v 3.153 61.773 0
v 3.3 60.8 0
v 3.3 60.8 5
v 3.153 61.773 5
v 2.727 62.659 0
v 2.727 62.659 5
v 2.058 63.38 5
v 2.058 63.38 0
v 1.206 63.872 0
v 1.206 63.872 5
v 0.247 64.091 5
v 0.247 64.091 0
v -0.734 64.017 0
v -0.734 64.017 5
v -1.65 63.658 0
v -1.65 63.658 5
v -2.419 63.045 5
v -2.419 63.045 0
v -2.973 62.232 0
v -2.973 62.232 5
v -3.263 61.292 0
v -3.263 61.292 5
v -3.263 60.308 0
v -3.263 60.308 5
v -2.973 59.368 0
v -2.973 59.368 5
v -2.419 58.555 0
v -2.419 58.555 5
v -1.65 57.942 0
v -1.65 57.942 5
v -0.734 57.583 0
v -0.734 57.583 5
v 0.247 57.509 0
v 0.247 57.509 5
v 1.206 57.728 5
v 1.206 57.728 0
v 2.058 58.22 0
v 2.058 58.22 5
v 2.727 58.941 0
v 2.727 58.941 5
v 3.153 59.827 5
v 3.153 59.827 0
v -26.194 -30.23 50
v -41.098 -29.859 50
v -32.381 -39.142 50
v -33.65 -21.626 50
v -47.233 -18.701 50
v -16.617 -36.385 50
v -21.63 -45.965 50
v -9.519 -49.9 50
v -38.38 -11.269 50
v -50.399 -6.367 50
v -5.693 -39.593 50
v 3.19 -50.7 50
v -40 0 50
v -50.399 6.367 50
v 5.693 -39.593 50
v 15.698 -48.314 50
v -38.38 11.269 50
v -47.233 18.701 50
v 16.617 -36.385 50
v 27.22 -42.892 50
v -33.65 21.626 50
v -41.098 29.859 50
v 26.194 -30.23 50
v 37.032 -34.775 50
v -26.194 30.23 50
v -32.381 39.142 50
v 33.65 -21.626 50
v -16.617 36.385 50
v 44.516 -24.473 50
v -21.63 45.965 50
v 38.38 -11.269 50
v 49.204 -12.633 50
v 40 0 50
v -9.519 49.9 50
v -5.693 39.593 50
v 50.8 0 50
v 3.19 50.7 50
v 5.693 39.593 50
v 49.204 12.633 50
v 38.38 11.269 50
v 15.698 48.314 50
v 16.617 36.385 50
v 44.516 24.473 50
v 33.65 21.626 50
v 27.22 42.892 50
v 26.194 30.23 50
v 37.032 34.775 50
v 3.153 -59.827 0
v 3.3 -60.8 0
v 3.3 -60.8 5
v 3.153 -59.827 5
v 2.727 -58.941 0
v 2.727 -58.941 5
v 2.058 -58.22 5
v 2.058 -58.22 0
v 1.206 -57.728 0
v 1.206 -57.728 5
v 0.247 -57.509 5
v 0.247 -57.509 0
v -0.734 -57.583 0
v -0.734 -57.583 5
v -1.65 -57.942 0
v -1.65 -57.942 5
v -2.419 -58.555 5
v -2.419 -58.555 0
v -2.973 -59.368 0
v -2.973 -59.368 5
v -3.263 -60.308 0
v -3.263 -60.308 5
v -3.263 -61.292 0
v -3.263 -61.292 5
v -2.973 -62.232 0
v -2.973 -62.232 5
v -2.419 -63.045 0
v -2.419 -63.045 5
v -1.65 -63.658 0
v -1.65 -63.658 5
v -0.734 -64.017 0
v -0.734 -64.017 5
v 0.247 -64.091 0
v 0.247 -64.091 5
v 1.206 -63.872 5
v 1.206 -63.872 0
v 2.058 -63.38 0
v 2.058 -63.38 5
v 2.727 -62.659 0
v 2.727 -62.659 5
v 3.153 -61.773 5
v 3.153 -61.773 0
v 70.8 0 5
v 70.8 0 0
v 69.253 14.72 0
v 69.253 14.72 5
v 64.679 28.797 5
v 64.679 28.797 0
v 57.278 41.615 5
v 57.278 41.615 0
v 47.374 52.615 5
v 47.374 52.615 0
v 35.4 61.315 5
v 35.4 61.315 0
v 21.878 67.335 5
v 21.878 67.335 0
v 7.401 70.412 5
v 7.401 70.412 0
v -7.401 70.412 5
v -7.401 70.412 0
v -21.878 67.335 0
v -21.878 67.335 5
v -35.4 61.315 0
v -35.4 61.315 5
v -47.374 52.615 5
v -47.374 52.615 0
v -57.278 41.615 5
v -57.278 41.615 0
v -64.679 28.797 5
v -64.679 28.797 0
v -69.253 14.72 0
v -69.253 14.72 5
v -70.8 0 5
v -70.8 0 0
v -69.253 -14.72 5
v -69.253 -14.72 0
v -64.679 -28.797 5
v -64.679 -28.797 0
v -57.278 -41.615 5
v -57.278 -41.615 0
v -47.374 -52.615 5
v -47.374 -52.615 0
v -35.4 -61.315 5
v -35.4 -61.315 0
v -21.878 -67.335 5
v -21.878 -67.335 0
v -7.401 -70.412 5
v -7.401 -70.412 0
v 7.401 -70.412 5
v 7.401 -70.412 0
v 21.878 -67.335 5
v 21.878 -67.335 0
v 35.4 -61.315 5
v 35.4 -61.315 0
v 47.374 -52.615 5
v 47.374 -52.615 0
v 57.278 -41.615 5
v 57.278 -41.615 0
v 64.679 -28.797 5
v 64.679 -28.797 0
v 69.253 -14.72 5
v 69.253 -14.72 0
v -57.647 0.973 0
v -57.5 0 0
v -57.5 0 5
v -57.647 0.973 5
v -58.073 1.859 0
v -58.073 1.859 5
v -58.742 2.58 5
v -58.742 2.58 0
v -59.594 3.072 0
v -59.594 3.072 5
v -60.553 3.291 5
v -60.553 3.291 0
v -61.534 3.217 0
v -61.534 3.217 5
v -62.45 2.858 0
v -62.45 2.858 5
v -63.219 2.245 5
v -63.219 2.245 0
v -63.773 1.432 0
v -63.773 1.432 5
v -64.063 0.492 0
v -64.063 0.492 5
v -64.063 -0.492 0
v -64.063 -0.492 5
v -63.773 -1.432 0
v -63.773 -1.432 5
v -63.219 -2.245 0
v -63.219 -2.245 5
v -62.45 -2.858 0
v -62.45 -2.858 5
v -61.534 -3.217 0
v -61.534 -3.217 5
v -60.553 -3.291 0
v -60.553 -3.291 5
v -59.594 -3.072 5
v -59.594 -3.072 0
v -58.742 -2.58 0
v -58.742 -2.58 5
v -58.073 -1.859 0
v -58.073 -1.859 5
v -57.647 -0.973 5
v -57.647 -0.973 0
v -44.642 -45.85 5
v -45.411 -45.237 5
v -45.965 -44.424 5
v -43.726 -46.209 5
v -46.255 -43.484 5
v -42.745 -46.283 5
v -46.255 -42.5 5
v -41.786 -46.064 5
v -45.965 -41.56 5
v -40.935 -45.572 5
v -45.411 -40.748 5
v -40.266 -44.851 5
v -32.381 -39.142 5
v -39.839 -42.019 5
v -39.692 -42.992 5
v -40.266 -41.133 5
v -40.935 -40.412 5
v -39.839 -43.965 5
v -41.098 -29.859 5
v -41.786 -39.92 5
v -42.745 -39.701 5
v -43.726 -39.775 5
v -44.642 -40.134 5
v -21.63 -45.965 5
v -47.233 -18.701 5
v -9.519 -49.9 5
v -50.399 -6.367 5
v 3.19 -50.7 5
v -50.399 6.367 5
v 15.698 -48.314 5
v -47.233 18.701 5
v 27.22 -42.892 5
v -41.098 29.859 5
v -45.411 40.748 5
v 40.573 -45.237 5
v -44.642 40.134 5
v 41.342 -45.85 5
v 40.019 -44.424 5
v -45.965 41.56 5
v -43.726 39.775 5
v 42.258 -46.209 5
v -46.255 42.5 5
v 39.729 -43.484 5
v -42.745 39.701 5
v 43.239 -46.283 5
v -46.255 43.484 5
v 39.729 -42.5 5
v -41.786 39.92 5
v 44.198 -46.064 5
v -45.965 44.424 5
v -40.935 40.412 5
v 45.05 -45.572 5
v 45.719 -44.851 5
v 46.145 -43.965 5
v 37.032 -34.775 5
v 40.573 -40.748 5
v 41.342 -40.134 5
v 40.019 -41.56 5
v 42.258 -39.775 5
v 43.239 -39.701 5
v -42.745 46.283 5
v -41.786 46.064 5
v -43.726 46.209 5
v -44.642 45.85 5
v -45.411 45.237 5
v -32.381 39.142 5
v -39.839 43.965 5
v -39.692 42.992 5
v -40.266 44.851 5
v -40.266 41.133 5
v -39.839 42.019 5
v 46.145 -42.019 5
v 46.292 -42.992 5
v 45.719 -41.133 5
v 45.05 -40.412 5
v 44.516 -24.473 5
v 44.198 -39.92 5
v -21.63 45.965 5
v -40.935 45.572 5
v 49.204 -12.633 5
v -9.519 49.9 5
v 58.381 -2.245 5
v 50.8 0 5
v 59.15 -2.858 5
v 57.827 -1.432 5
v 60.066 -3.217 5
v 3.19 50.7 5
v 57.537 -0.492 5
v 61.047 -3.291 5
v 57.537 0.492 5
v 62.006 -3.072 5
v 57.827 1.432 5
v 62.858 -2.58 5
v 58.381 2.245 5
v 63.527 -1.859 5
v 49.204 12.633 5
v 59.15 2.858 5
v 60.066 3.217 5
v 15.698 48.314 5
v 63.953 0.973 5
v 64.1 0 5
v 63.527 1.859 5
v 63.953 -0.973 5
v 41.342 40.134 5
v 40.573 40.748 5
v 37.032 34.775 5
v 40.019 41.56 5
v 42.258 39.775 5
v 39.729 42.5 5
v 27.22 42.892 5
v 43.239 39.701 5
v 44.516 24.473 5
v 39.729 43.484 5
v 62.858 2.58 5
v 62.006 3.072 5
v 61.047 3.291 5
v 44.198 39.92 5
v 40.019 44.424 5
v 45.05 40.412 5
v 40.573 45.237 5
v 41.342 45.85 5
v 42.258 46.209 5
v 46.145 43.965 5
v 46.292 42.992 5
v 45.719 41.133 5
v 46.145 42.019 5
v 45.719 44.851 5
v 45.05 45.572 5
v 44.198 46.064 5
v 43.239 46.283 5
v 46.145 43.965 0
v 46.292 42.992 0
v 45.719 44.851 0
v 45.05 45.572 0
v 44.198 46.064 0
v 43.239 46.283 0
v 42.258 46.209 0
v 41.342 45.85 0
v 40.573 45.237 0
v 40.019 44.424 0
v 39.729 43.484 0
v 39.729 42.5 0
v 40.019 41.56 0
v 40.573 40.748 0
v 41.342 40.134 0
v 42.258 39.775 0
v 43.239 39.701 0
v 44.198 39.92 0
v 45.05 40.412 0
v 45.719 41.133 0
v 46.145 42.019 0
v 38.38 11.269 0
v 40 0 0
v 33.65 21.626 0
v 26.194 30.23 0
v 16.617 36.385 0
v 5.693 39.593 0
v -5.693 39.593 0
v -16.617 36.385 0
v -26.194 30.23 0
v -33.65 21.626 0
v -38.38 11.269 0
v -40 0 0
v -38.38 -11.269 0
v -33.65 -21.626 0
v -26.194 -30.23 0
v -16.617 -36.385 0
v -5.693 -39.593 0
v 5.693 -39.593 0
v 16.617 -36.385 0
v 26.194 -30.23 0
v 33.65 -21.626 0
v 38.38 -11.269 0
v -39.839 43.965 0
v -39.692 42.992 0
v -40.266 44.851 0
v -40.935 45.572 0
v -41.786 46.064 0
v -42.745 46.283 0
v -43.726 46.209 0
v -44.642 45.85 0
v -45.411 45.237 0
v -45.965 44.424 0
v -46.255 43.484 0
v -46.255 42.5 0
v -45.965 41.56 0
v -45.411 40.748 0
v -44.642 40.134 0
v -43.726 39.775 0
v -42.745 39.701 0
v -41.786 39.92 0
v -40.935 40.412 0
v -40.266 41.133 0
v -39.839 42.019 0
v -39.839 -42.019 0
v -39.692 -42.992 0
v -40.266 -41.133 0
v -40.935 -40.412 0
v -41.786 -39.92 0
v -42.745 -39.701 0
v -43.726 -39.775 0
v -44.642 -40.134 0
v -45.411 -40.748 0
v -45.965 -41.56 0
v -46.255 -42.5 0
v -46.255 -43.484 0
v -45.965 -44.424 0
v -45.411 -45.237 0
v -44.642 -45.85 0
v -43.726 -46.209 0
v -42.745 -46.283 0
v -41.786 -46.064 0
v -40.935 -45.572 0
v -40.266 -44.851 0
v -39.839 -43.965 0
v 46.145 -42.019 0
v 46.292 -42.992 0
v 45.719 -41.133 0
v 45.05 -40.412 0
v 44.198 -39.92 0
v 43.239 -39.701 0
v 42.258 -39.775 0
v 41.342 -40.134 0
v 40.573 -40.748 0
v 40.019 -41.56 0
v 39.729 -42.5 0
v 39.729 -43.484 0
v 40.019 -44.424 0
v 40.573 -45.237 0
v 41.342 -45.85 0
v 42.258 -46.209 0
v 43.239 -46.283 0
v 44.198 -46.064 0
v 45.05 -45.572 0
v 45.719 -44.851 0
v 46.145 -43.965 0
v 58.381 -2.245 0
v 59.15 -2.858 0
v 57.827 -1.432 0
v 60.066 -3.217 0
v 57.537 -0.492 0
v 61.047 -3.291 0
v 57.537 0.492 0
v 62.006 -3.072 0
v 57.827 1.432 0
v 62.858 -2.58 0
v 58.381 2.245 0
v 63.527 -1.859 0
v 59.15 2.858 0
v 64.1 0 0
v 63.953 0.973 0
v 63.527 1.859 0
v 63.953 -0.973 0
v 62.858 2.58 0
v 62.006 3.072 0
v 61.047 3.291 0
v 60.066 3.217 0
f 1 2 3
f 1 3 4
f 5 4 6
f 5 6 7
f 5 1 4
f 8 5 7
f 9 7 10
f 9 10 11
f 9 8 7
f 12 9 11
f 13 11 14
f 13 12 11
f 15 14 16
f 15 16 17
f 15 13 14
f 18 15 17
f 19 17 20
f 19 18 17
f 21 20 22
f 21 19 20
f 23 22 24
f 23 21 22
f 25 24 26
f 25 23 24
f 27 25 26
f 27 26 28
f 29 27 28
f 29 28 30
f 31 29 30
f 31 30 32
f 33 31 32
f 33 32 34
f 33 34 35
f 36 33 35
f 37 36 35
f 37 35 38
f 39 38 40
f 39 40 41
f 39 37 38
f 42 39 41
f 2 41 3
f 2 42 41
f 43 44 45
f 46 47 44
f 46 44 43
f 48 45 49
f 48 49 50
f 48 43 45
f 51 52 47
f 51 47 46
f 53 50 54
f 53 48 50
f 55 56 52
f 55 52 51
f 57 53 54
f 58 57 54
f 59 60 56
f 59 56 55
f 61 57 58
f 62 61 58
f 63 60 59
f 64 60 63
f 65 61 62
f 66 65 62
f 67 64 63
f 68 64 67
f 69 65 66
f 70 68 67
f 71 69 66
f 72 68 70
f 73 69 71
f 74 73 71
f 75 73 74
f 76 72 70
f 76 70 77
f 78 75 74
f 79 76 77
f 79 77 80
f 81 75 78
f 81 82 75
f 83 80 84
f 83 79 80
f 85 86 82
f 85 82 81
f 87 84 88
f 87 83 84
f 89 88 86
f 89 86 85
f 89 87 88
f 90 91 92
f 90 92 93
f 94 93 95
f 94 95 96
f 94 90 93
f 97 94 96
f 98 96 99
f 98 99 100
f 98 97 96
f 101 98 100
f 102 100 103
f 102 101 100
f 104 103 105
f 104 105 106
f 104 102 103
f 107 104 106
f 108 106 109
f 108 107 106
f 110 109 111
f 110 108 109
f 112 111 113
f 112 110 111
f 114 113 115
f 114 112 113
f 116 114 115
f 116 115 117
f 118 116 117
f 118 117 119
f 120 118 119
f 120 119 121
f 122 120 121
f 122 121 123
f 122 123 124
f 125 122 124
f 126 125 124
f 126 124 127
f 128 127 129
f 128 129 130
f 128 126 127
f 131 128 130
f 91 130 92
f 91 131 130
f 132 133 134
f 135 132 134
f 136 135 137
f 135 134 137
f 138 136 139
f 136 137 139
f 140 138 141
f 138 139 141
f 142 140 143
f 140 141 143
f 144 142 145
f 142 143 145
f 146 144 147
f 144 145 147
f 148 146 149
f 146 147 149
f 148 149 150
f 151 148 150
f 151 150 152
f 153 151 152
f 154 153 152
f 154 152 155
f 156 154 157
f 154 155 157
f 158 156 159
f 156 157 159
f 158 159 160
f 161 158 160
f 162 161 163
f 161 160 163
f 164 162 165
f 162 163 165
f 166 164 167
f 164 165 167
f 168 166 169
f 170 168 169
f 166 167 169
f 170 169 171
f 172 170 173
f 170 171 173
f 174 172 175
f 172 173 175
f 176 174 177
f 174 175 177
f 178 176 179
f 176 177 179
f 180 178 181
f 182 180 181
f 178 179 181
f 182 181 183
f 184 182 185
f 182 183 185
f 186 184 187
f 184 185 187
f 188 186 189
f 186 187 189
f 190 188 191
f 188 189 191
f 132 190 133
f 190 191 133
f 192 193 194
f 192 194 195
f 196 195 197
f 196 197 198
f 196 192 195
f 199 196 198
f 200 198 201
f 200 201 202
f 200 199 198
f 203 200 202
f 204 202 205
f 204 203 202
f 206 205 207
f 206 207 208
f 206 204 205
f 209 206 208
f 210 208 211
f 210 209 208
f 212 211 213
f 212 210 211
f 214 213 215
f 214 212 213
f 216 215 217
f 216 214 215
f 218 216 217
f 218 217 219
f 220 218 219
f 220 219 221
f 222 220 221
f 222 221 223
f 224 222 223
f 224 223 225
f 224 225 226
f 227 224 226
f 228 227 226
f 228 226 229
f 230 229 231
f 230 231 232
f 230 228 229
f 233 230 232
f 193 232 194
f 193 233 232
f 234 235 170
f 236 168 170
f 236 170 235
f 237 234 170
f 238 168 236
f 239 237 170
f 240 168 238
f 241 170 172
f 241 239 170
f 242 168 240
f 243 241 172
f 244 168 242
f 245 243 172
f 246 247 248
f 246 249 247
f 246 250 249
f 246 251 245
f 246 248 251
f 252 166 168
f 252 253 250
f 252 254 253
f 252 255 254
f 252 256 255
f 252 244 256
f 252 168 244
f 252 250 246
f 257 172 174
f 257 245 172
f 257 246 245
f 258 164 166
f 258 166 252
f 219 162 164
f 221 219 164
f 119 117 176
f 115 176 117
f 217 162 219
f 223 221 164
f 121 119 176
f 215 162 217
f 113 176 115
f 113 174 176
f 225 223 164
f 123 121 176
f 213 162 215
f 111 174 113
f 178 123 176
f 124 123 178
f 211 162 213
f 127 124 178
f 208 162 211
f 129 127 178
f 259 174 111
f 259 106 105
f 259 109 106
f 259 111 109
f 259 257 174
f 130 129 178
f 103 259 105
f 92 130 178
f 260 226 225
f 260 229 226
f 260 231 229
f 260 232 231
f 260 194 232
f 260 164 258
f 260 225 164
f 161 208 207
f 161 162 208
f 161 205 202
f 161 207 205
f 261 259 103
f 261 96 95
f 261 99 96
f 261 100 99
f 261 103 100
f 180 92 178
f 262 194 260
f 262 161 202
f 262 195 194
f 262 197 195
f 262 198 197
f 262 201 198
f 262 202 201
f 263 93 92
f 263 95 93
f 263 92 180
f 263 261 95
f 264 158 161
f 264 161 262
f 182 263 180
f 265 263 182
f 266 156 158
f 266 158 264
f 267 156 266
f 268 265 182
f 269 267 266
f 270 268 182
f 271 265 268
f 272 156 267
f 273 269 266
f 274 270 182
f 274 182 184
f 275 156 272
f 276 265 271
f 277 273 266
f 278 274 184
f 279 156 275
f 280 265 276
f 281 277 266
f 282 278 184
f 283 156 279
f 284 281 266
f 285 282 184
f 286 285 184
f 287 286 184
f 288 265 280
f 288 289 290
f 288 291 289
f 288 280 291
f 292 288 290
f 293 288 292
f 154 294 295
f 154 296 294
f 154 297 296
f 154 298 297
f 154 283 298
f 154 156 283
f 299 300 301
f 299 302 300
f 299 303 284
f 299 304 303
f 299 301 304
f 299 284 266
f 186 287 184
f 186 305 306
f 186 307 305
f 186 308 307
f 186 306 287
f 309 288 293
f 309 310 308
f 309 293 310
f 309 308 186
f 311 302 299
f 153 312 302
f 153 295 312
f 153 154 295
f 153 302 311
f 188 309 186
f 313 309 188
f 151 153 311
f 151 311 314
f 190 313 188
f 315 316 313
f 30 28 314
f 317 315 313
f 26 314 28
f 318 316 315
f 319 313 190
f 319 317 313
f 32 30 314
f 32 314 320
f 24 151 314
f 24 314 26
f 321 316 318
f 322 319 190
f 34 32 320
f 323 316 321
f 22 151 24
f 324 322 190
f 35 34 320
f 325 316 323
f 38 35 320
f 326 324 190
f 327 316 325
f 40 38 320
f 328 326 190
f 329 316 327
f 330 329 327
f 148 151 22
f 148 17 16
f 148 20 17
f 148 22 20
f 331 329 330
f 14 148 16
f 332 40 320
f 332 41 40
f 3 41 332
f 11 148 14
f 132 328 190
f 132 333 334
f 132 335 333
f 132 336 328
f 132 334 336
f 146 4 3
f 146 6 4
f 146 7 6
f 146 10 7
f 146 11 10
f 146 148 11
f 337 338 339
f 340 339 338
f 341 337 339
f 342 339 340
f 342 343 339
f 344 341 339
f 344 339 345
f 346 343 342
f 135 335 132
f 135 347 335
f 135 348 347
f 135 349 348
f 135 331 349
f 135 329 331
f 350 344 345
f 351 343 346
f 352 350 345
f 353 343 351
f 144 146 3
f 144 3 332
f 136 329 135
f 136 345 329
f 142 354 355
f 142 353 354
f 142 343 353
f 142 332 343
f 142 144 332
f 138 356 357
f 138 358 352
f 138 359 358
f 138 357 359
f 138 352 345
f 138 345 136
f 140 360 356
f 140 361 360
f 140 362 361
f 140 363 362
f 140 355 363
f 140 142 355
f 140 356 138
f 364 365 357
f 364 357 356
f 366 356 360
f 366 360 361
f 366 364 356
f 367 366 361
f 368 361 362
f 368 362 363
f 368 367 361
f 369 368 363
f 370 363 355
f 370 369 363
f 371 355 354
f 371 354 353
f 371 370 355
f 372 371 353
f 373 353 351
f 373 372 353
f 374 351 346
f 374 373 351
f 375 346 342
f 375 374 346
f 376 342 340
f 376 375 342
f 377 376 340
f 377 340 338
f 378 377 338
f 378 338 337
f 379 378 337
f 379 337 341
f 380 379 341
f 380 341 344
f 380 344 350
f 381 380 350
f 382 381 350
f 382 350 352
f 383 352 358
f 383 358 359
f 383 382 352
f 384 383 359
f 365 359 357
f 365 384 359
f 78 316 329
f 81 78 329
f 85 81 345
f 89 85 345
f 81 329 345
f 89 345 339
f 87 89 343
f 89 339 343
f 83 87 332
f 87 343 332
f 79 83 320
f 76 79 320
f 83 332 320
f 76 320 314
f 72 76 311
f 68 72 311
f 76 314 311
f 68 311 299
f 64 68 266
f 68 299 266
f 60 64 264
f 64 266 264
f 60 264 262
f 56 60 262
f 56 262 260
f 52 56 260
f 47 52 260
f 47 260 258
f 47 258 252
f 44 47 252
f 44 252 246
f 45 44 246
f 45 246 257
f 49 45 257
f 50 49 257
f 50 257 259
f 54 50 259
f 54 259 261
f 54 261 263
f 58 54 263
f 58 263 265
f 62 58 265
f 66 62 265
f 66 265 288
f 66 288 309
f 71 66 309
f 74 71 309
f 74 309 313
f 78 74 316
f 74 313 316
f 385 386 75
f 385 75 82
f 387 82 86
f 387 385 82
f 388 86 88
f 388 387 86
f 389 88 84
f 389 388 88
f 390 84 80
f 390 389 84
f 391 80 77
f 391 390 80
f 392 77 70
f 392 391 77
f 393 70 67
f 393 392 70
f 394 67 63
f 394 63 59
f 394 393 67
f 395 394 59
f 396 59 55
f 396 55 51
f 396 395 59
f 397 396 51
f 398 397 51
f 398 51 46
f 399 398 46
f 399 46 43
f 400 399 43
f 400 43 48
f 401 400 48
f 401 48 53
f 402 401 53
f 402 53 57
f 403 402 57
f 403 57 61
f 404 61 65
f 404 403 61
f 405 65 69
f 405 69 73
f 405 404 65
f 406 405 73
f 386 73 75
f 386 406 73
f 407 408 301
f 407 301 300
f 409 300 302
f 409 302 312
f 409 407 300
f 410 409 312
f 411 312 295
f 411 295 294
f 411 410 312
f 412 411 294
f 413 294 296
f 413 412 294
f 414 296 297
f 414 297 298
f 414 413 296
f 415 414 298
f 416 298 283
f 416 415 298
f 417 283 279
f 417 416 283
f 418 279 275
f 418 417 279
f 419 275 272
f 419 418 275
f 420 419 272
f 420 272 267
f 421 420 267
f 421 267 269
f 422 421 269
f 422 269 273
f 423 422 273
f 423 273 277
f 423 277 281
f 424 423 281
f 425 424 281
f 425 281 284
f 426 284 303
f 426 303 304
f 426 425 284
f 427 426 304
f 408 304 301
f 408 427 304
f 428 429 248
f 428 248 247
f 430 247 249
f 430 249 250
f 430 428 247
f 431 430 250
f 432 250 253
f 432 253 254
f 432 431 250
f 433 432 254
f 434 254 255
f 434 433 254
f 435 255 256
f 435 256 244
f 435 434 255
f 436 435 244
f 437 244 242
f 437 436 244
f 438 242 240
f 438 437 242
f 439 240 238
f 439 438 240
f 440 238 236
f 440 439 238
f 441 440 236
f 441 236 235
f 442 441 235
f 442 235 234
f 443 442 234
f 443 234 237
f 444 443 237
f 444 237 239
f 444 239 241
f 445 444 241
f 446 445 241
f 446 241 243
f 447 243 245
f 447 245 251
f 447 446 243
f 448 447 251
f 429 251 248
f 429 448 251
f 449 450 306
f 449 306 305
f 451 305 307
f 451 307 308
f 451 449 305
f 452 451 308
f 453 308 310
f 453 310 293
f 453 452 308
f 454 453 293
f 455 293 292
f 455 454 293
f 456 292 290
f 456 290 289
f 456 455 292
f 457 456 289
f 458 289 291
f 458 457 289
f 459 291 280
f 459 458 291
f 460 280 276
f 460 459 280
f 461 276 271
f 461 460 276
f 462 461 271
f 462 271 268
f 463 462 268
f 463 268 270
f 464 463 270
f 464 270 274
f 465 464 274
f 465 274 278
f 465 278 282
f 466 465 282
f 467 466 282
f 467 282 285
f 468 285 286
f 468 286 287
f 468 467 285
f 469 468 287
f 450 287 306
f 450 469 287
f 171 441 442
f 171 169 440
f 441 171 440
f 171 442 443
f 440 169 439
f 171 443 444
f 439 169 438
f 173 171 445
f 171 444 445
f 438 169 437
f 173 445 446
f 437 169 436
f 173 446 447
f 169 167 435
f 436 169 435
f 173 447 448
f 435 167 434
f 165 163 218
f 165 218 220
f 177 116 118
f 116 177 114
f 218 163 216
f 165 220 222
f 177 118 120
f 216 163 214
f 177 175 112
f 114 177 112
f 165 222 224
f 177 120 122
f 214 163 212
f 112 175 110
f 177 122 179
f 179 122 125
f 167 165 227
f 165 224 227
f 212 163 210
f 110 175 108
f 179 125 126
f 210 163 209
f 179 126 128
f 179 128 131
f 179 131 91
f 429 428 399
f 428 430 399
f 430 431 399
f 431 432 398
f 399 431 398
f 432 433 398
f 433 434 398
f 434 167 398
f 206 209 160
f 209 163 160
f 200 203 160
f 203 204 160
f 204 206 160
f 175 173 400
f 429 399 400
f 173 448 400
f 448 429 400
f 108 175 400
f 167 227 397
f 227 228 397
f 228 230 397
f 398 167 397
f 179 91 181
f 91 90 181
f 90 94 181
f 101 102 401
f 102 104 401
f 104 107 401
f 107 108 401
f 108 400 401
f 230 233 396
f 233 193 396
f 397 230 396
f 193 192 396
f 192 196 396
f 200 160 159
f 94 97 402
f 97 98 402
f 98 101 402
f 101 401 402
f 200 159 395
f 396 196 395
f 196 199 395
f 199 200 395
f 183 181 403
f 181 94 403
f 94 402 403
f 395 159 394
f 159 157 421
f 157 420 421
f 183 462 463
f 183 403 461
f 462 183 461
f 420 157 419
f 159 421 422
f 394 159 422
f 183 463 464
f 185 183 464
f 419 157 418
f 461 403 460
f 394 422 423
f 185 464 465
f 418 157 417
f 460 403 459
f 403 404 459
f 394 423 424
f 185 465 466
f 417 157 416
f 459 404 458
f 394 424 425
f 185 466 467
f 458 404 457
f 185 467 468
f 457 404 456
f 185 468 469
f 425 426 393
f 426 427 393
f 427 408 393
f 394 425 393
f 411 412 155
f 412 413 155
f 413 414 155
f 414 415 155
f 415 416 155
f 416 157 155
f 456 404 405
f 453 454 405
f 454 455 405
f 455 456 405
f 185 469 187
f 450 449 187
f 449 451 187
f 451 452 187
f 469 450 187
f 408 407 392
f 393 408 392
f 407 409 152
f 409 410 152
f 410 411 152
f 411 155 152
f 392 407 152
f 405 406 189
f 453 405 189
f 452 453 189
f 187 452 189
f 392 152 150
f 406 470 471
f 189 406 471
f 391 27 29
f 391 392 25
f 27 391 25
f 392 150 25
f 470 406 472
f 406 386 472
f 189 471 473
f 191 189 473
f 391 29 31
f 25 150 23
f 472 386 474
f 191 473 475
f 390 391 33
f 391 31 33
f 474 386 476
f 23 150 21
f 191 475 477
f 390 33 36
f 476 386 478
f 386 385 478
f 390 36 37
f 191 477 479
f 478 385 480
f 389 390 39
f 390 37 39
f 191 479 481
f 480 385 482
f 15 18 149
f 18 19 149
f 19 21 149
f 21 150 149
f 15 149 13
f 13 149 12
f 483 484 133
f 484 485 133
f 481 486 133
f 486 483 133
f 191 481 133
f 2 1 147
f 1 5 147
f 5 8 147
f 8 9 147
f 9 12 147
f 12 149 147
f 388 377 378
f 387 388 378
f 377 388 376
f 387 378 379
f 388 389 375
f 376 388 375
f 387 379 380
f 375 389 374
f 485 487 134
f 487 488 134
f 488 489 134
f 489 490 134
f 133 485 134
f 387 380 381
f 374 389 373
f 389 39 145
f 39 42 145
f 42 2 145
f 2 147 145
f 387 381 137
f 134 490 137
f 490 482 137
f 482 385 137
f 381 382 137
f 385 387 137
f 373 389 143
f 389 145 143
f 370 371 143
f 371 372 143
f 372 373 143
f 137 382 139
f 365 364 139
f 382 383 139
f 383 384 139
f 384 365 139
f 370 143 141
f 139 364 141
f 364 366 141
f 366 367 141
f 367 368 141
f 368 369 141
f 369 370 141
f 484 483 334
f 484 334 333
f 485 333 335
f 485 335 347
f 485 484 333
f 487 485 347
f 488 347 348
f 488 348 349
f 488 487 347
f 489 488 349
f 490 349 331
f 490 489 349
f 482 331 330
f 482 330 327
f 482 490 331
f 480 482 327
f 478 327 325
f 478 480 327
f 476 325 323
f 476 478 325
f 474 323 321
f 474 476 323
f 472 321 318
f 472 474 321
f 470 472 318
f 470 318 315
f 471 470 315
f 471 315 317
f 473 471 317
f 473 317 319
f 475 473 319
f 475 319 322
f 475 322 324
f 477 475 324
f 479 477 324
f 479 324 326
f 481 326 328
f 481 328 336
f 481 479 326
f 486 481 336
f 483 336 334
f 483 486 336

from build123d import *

# Parameters (mm, degrees)
F0_R     = 50.8
F0_R_2   = 40
F1_DEPTH = 50
F2_R     = 70.8
F2_R_2   = 3.3
F2_R_3   = 50.8
F3_DEPTH = 5


with BuildPart() as f1:
    # F0 (on Top) → F1 (new body)
    with BuildSketch(Plane.XY):
        Circle(F0_R)
        Circle(F0_R_2, mode=Mode.SUBTRACT)
    extrude(amount=F1_DEPTH)

    # F2 (on Top) → F3 (join)
    with BuildSketch(Plane.XY):
        Circle(F2_R)
        with Locations((-42.992092, -42.992092)):
            Circle(F2_R_2, mode=Mode.SUBTRACT)
        with Locations((0, -60.8)):
            Circle(F2_R_2, mode=Mode.SUBTRACT)
        with Locations((42.992092, -42.992092)):
            Circle(F2_R_2, mode=Mode.SUBTRACT)
        with Locations((-60.8, 0)):
            Circle(F2_R_2, mode=Mode.SUBTRACT)
        with Locations((-42.992092, 42.992092)):
            Circle(F2_R_2, mode=Mode.SUBTRACT)
        Circle(F2_R_3, mode=Mode.SUBTRACT)
        with Locations((60.8, 0)):
            Circle(F2_R_2, mode=Mode.SUBTRACT)
        with Locations((0, 60.8)):
            Circle(F2_R_2, mode=Mode.SUBTRACT)
        with Locations((42.992092, 42.992092)):
            Circle(F2_R_2, mode=Mode.SUBTRACT)
    extrude(amount=F3_DEPTH)


solid = f1.part
